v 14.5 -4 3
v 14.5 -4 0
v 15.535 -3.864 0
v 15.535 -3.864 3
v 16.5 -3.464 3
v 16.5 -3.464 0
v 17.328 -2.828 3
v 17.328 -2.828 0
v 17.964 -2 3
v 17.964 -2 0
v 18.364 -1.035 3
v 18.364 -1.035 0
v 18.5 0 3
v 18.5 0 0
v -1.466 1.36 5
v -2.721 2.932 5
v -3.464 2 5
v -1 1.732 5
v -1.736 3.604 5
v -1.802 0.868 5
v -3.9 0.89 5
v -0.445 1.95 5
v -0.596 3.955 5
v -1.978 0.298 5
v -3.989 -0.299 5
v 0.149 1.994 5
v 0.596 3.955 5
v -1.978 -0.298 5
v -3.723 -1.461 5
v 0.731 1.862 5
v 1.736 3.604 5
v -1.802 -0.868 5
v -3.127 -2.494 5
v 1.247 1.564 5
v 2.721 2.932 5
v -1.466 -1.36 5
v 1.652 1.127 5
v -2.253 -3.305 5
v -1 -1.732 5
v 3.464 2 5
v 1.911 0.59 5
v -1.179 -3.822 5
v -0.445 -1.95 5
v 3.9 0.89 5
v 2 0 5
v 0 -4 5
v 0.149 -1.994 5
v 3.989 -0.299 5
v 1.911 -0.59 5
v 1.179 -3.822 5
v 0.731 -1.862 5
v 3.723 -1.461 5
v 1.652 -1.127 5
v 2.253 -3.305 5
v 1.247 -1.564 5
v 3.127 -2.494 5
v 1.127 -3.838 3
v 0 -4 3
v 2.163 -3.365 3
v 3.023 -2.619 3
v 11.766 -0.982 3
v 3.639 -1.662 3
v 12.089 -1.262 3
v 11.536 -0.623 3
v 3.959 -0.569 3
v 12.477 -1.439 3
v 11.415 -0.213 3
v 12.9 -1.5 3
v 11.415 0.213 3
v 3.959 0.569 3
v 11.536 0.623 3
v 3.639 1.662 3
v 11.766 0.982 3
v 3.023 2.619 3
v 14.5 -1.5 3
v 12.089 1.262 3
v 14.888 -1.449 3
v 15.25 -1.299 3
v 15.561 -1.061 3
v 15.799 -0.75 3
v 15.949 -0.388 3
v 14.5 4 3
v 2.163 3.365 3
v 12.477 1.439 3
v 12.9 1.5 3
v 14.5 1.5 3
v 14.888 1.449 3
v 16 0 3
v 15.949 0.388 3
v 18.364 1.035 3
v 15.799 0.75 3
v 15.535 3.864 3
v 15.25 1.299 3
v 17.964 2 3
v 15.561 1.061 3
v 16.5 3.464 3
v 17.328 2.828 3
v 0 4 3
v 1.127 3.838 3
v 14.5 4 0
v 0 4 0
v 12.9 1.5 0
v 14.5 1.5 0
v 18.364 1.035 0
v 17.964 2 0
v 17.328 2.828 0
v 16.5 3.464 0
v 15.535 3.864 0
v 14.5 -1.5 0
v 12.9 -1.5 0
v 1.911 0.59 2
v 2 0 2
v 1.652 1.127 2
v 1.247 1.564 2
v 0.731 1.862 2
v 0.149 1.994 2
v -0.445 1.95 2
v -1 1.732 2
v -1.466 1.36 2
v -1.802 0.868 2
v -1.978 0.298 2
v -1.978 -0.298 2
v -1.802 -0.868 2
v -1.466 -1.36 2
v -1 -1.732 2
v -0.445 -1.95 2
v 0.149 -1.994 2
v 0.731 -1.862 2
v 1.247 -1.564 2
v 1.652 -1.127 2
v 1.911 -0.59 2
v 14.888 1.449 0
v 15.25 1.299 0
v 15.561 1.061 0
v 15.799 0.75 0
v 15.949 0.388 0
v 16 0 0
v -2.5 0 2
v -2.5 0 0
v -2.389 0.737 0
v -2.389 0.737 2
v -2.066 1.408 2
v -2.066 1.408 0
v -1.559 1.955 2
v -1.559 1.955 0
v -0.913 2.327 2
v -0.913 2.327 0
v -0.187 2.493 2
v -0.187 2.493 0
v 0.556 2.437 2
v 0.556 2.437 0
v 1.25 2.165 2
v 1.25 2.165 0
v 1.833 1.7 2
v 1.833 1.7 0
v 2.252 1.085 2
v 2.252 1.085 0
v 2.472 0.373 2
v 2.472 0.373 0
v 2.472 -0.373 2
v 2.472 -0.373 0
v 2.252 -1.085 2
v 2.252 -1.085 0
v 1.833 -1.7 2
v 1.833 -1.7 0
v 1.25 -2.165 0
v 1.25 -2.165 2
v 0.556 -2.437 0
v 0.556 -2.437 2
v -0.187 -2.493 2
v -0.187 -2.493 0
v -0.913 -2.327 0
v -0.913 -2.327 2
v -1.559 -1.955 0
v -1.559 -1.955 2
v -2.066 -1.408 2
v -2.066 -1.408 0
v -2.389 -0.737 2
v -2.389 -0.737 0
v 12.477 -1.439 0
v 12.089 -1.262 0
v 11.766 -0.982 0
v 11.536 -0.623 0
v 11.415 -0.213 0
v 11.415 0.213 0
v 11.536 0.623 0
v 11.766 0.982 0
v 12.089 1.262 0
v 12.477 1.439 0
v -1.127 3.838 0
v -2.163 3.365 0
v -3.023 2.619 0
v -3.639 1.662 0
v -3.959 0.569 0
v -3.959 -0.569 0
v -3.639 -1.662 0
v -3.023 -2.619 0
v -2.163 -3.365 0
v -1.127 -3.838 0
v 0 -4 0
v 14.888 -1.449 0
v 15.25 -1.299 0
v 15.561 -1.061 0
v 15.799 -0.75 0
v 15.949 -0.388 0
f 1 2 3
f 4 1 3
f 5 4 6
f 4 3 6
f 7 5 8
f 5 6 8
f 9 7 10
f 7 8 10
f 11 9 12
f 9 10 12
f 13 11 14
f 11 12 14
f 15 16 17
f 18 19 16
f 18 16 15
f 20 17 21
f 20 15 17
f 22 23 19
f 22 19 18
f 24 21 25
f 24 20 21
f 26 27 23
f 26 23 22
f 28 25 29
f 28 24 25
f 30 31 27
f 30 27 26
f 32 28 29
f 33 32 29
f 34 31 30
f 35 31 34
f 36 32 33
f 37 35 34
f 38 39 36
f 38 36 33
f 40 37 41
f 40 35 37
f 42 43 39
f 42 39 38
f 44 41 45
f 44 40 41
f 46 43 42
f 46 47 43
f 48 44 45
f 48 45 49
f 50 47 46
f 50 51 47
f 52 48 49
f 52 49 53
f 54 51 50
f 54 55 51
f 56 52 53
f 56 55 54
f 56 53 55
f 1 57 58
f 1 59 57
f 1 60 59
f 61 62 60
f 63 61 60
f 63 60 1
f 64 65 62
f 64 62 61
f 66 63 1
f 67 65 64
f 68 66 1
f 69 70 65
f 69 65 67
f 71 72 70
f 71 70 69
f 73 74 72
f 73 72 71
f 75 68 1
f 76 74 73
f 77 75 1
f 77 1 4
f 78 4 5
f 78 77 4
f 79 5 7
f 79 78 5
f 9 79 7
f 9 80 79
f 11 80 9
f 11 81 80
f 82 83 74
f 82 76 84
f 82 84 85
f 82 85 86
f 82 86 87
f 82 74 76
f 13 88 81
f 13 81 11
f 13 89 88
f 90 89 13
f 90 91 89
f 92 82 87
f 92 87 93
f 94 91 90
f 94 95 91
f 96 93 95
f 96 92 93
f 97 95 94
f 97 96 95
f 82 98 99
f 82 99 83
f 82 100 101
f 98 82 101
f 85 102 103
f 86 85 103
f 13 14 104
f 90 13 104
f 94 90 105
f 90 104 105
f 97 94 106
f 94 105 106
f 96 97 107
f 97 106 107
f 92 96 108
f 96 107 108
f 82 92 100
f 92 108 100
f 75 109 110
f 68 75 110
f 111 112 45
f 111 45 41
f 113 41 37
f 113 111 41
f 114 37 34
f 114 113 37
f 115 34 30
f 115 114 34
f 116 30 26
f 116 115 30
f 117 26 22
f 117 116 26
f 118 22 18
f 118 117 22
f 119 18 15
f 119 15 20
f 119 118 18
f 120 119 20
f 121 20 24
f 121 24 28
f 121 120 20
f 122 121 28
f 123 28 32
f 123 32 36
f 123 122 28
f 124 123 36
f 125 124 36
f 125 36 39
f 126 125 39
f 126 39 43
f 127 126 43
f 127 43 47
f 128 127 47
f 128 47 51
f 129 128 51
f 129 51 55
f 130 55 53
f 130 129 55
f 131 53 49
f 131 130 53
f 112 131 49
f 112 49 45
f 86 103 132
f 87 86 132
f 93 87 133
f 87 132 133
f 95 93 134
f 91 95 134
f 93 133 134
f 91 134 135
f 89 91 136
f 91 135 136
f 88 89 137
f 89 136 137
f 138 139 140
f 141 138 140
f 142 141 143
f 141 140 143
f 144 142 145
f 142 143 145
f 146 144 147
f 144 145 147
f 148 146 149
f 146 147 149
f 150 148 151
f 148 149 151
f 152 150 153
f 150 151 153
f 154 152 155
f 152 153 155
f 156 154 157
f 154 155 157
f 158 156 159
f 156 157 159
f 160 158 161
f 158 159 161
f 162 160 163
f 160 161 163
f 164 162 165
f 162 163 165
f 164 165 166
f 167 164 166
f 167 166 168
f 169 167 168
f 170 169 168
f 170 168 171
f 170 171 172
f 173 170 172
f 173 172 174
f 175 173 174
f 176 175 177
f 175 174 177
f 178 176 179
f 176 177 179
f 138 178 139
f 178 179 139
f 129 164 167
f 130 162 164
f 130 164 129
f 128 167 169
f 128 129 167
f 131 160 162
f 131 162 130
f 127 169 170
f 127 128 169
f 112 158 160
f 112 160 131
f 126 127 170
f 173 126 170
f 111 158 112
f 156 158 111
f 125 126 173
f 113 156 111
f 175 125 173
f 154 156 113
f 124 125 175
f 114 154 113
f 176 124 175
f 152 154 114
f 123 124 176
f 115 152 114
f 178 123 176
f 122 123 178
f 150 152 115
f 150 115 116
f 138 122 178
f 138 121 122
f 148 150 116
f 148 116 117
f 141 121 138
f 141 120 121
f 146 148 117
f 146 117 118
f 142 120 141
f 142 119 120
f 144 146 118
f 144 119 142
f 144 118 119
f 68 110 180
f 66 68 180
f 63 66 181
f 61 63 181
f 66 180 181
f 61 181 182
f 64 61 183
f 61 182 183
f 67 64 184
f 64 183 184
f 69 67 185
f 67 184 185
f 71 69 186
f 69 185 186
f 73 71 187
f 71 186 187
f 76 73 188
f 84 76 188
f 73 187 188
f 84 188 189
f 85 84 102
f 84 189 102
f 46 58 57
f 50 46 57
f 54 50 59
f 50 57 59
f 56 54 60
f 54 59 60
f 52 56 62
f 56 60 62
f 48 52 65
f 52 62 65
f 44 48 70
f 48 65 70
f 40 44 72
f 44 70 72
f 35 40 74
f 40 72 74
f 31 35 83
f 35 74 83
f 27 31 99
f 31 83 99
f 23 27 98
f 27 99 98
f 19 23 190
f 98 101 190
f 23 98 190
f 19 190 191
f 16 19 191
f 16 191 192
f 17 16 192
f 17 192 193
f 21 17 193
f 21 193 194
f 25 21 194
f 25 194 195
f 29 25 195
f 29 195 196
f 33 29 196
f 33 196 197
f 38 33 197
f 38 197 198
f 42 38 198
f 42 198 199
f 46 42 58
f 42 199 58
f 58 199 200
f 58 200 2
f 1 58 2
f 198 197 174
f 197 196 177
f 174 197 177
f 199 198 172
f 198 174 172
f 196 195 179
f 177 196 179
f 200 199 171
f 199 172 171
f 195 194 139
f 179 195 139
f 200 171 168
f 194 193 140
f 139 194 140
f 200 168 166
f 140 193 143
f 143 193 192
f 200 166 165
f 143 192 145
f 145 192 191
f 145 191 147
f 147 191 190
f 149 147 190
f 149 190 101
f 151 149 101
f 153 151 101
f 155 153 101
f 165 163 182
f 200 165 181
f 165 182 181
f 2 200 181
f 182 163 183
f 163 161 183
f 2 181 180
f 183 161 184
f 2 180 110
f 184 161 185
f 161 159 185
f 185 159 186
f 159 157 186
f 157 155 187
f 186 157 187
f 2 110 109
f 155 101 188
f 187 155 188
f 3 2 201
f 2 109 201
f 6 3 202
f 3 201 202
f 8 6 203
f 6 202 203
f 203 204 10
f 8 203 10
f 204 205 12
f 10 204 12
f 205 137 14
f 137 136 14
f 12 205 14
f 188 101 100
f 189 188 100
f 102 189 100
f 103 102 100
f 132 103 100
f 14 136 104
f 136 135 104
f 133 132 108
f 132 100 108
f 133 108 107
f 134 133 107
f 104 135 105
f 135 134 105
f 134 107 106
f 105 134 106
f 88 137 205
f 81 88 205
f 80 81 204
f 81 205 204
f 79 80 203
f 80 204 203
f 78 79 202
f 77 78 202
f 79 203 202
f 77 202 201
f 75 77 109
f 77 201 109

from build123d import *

# Parameters (mm, degrees)
CROQUIS1_R              = 4
CROQUIS1_R_2            = 2
SALIENTE_EXTRUIR1_DEPTH = 3
CROQUIS2_R              = 4
CROQUIS2_R_2            = 2
SALIENTE_EXTRUIR2_DEPTH = 2
CROQUIS3_R              = 2.5
CORTAR_EXTRUIR1_DEPTH   = 2


with BuildPart() as part:
    # Croquis1 → Saliente-Extruir1 (new body)
    # profile 1 of 3: a face of its own
    with BuildSketch(Plane.XY):
        Circle(CROQUIS1_R)
        Circle(CROQUIS1_R_2, mode=Mode.SUBTRACT)
    # profile 2 of 3: a face of its own
    with BuildSketch(Plane.XY):
        with BuildLine():
            Line((14.5, 4), (0, 4))
            ThreePointArc((0, 4), (2.828427125, 2.828427125), (4, 0))
            ThreePointArc((4, 0), (2.828427125, -2.828427125), (0, -4))
            Line((0, -4), (14.5, -4))
            ThreePointArc((14.5, -4), (10.5, 0), (14.5, 4))
        make_face()
    # profile 3 of 3: a face of its own
    with BuildSketch(Plane.XY):
        with BuildLine():
            ThreePointArc((18.5, 0), (17.328427125, 2.828427125), (14.5, 4))
            ThreePointArc((14.5, 4), (10.5, 0), (14.5, -4))
            ThreePointArc((14.5, -4), (17.328427125, -2.828427125), (18.5, 0))
        make_face()
        with BuildLine():
            Line((14.5, -1.5), (12.9, -1.5))
            ThreePointArc((12.9, -1.5), (11.4, 0), (12.9, 1.5))
            Line((12.9, 1.5), (14.5, 1.5))
            ThreePointArc((14.5, 1.5), (15.560660172, 1.060660172), (16, 0))
            ThreePointArc((16, 0), (15.560660172, -1.060660172), (14.5, -1.5))
        make_face(mode=Mode.SUBTRACT)
    extrude(amount=SALIENTE_EXTRUIR1_DEPTH)

    # Croquis2 → Saliente-Extruir2 (add)
    with BuildSketch(Plane.XY.offset(3)):
        with Locations(Location((0, 0, 0), (0, 0, 270))):
            Circle(CROQUIS2_R)
        Circle(CROQUIS2_R_2, mode=Mode.SUBTRACT)
    extrude(amount=SALIENTE_EXTRUIR2_DEPTH)

    # Croquis3 → Cortar-Extruir1 (cut)
    with BuildSketch(Plane(origin=(0, 0, 0), x_dir=(-1, 0, 0), z_dir=(0, 0, -1))):
        Circle(CROQUIS3_R)
    extrude(amount=-CORTAR_EXTRUIR1_DEPTH, mode=Mode.SUBTRACT)


solid = part.part
